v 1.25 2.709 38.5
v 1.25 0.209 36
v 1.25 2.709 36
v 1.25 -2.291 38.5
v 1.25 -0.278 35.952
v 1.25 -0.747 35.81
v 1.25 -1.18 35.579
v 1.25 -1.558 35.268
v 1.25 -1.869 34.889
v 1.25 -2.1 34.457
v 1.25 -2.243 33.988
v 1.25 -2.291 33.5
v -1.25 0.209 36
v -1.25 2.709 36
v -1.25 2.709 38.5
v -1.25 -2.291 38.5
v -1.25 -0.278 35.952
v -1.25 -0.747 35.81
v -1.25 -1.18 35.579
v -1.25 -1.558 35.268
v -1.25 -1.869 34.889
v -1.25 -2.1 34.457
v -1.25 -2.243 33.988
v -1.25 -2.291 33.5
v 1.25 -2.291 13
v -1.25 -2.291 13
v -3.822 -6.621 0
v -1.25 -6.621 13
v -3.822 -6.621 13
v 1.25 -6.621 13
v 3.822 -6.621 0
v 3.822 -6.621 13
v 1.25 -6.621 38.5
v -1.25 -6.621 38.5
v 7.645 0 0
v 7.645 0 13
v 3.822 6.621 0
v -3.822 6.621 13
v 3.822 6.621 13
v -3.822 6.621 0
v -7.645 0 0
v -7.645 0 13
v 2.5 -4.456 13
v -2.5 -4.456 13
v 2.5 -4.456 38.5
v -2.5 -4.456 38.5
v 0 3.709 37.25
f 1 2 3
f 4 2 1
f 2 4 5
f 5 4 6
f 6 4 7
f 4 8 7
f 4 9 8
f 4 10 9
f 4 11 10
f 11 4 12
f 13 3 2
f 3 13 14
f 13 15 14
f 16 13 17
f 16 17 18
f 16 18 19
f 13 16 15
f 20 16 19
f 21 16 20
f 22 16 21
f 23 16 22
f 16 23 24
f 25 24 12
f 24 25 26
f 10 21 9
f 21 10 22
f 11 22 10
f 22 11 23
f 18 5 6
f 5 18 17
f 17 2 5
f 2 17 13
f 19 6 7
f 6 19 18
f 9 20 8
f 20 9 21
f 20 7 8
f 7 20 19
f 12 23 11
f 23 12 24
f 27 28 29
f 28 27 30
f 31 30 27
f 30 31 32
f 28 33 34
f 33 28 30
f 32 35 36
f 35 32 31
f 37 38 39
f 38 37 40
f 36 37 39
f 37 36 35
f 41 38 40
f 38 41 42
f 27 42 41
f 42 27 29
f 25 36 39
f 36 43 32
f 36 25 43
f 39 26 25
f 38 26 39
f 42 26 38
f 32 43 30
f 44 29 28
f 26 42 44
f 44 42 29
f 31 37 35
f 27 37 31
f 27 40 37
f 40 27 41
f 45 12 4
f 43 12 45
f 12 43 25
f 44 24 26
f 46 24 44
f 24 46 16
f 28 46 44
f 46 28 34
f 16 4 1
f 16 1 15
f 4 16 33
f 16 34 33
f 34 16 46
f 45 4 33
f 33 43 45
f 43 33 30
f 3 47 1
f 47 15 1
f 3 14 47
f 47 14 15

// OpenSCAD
/*
    hsw_parametric_hook - OpenSCAD script to generate hooks for the Honeycomb Storage Wall (HSW) system
    Copyright (C) 2024  nomike[AT]nomike[DOT]com

    This work is released with CC0 into the public domain.
*/

insert_length = 13;
hook_length = 25.5;
hook_diameter = 5;
hook_nose_height = 5;
slope_height = 1;

const_hsw_diameter = 15.29; // 15.15 mm hooks slide in and out with ease. 15.29 mm is neatly tight.



_hsw_inner_circle_diameter = (sqrt(3) / 2) * const_hsw_diameter;
_hook_inner_circle_radius = (sqrt(3) / 2) * hook_diameter;
echo(_hsw_inner_circle_diameter)
echo(_hook_inner_circle_radius)

// HSW insert
cylinder(d=const_hsw_diameter, h=insert_length, $fn=6);

// Hook
translate([0, 0 - (_hsw_inner_circle_diameter / 2) + (_hook_inner_circle_radius / 2), insert_length]) cylinder(d=hook_diameter, h=hook_length, $fn=6);

// Fillet
difference() {
    translate([0, 0 - (_hsw_inner_circle_diameter / 2)  + _hook_inner_circle_radius + hook_diameter / 4, insert_length + hook_length - hook_diameter / 4 - hook_diameter / 2])
    color("black") cube([hook_diameter / 2, hook_diameter / 2, hook_diameter / 2], center=true);
    translate([0 - (hook_diameter / 4), 0 - (_hsw_inner_circle_diameter / 2)  + _hook_inner_circle_radius + hook_diameter / 4 + hook_diameter/4, insert_length + hook_length - hook_diameter / 2 - hook_diameter / 2], $fn=32) rotate([0, 90, 0]) cylinder(d=hook_diameter, h=hook_diameter / 2);
}

// Hook Nose
translate([0, 0 - (_hsw_inner_circle_diameter / 2)  + _hook_inner_circle_radius + hook_nose_height / 2, insert_length + hook_length - hook_diameter / 4])
cube([hook_diameter / 2, hook_nose_height, hook_diameter / 2], center=true);

// Hook Nose Top Pyramid
translate([0, 0 - (_hsw_inner_circle_diameter / 2)  + _hook_inner_circle_radius + hook_nose_height + (slope_height / 2), insert_length + hook_length - hook_diameter / 4])
rotate([90, 45, 0])
cylinder(d2=hook_diameter / 2 * sqrt(2), d1=0, h = slope_height, center=true, $fn=4);
